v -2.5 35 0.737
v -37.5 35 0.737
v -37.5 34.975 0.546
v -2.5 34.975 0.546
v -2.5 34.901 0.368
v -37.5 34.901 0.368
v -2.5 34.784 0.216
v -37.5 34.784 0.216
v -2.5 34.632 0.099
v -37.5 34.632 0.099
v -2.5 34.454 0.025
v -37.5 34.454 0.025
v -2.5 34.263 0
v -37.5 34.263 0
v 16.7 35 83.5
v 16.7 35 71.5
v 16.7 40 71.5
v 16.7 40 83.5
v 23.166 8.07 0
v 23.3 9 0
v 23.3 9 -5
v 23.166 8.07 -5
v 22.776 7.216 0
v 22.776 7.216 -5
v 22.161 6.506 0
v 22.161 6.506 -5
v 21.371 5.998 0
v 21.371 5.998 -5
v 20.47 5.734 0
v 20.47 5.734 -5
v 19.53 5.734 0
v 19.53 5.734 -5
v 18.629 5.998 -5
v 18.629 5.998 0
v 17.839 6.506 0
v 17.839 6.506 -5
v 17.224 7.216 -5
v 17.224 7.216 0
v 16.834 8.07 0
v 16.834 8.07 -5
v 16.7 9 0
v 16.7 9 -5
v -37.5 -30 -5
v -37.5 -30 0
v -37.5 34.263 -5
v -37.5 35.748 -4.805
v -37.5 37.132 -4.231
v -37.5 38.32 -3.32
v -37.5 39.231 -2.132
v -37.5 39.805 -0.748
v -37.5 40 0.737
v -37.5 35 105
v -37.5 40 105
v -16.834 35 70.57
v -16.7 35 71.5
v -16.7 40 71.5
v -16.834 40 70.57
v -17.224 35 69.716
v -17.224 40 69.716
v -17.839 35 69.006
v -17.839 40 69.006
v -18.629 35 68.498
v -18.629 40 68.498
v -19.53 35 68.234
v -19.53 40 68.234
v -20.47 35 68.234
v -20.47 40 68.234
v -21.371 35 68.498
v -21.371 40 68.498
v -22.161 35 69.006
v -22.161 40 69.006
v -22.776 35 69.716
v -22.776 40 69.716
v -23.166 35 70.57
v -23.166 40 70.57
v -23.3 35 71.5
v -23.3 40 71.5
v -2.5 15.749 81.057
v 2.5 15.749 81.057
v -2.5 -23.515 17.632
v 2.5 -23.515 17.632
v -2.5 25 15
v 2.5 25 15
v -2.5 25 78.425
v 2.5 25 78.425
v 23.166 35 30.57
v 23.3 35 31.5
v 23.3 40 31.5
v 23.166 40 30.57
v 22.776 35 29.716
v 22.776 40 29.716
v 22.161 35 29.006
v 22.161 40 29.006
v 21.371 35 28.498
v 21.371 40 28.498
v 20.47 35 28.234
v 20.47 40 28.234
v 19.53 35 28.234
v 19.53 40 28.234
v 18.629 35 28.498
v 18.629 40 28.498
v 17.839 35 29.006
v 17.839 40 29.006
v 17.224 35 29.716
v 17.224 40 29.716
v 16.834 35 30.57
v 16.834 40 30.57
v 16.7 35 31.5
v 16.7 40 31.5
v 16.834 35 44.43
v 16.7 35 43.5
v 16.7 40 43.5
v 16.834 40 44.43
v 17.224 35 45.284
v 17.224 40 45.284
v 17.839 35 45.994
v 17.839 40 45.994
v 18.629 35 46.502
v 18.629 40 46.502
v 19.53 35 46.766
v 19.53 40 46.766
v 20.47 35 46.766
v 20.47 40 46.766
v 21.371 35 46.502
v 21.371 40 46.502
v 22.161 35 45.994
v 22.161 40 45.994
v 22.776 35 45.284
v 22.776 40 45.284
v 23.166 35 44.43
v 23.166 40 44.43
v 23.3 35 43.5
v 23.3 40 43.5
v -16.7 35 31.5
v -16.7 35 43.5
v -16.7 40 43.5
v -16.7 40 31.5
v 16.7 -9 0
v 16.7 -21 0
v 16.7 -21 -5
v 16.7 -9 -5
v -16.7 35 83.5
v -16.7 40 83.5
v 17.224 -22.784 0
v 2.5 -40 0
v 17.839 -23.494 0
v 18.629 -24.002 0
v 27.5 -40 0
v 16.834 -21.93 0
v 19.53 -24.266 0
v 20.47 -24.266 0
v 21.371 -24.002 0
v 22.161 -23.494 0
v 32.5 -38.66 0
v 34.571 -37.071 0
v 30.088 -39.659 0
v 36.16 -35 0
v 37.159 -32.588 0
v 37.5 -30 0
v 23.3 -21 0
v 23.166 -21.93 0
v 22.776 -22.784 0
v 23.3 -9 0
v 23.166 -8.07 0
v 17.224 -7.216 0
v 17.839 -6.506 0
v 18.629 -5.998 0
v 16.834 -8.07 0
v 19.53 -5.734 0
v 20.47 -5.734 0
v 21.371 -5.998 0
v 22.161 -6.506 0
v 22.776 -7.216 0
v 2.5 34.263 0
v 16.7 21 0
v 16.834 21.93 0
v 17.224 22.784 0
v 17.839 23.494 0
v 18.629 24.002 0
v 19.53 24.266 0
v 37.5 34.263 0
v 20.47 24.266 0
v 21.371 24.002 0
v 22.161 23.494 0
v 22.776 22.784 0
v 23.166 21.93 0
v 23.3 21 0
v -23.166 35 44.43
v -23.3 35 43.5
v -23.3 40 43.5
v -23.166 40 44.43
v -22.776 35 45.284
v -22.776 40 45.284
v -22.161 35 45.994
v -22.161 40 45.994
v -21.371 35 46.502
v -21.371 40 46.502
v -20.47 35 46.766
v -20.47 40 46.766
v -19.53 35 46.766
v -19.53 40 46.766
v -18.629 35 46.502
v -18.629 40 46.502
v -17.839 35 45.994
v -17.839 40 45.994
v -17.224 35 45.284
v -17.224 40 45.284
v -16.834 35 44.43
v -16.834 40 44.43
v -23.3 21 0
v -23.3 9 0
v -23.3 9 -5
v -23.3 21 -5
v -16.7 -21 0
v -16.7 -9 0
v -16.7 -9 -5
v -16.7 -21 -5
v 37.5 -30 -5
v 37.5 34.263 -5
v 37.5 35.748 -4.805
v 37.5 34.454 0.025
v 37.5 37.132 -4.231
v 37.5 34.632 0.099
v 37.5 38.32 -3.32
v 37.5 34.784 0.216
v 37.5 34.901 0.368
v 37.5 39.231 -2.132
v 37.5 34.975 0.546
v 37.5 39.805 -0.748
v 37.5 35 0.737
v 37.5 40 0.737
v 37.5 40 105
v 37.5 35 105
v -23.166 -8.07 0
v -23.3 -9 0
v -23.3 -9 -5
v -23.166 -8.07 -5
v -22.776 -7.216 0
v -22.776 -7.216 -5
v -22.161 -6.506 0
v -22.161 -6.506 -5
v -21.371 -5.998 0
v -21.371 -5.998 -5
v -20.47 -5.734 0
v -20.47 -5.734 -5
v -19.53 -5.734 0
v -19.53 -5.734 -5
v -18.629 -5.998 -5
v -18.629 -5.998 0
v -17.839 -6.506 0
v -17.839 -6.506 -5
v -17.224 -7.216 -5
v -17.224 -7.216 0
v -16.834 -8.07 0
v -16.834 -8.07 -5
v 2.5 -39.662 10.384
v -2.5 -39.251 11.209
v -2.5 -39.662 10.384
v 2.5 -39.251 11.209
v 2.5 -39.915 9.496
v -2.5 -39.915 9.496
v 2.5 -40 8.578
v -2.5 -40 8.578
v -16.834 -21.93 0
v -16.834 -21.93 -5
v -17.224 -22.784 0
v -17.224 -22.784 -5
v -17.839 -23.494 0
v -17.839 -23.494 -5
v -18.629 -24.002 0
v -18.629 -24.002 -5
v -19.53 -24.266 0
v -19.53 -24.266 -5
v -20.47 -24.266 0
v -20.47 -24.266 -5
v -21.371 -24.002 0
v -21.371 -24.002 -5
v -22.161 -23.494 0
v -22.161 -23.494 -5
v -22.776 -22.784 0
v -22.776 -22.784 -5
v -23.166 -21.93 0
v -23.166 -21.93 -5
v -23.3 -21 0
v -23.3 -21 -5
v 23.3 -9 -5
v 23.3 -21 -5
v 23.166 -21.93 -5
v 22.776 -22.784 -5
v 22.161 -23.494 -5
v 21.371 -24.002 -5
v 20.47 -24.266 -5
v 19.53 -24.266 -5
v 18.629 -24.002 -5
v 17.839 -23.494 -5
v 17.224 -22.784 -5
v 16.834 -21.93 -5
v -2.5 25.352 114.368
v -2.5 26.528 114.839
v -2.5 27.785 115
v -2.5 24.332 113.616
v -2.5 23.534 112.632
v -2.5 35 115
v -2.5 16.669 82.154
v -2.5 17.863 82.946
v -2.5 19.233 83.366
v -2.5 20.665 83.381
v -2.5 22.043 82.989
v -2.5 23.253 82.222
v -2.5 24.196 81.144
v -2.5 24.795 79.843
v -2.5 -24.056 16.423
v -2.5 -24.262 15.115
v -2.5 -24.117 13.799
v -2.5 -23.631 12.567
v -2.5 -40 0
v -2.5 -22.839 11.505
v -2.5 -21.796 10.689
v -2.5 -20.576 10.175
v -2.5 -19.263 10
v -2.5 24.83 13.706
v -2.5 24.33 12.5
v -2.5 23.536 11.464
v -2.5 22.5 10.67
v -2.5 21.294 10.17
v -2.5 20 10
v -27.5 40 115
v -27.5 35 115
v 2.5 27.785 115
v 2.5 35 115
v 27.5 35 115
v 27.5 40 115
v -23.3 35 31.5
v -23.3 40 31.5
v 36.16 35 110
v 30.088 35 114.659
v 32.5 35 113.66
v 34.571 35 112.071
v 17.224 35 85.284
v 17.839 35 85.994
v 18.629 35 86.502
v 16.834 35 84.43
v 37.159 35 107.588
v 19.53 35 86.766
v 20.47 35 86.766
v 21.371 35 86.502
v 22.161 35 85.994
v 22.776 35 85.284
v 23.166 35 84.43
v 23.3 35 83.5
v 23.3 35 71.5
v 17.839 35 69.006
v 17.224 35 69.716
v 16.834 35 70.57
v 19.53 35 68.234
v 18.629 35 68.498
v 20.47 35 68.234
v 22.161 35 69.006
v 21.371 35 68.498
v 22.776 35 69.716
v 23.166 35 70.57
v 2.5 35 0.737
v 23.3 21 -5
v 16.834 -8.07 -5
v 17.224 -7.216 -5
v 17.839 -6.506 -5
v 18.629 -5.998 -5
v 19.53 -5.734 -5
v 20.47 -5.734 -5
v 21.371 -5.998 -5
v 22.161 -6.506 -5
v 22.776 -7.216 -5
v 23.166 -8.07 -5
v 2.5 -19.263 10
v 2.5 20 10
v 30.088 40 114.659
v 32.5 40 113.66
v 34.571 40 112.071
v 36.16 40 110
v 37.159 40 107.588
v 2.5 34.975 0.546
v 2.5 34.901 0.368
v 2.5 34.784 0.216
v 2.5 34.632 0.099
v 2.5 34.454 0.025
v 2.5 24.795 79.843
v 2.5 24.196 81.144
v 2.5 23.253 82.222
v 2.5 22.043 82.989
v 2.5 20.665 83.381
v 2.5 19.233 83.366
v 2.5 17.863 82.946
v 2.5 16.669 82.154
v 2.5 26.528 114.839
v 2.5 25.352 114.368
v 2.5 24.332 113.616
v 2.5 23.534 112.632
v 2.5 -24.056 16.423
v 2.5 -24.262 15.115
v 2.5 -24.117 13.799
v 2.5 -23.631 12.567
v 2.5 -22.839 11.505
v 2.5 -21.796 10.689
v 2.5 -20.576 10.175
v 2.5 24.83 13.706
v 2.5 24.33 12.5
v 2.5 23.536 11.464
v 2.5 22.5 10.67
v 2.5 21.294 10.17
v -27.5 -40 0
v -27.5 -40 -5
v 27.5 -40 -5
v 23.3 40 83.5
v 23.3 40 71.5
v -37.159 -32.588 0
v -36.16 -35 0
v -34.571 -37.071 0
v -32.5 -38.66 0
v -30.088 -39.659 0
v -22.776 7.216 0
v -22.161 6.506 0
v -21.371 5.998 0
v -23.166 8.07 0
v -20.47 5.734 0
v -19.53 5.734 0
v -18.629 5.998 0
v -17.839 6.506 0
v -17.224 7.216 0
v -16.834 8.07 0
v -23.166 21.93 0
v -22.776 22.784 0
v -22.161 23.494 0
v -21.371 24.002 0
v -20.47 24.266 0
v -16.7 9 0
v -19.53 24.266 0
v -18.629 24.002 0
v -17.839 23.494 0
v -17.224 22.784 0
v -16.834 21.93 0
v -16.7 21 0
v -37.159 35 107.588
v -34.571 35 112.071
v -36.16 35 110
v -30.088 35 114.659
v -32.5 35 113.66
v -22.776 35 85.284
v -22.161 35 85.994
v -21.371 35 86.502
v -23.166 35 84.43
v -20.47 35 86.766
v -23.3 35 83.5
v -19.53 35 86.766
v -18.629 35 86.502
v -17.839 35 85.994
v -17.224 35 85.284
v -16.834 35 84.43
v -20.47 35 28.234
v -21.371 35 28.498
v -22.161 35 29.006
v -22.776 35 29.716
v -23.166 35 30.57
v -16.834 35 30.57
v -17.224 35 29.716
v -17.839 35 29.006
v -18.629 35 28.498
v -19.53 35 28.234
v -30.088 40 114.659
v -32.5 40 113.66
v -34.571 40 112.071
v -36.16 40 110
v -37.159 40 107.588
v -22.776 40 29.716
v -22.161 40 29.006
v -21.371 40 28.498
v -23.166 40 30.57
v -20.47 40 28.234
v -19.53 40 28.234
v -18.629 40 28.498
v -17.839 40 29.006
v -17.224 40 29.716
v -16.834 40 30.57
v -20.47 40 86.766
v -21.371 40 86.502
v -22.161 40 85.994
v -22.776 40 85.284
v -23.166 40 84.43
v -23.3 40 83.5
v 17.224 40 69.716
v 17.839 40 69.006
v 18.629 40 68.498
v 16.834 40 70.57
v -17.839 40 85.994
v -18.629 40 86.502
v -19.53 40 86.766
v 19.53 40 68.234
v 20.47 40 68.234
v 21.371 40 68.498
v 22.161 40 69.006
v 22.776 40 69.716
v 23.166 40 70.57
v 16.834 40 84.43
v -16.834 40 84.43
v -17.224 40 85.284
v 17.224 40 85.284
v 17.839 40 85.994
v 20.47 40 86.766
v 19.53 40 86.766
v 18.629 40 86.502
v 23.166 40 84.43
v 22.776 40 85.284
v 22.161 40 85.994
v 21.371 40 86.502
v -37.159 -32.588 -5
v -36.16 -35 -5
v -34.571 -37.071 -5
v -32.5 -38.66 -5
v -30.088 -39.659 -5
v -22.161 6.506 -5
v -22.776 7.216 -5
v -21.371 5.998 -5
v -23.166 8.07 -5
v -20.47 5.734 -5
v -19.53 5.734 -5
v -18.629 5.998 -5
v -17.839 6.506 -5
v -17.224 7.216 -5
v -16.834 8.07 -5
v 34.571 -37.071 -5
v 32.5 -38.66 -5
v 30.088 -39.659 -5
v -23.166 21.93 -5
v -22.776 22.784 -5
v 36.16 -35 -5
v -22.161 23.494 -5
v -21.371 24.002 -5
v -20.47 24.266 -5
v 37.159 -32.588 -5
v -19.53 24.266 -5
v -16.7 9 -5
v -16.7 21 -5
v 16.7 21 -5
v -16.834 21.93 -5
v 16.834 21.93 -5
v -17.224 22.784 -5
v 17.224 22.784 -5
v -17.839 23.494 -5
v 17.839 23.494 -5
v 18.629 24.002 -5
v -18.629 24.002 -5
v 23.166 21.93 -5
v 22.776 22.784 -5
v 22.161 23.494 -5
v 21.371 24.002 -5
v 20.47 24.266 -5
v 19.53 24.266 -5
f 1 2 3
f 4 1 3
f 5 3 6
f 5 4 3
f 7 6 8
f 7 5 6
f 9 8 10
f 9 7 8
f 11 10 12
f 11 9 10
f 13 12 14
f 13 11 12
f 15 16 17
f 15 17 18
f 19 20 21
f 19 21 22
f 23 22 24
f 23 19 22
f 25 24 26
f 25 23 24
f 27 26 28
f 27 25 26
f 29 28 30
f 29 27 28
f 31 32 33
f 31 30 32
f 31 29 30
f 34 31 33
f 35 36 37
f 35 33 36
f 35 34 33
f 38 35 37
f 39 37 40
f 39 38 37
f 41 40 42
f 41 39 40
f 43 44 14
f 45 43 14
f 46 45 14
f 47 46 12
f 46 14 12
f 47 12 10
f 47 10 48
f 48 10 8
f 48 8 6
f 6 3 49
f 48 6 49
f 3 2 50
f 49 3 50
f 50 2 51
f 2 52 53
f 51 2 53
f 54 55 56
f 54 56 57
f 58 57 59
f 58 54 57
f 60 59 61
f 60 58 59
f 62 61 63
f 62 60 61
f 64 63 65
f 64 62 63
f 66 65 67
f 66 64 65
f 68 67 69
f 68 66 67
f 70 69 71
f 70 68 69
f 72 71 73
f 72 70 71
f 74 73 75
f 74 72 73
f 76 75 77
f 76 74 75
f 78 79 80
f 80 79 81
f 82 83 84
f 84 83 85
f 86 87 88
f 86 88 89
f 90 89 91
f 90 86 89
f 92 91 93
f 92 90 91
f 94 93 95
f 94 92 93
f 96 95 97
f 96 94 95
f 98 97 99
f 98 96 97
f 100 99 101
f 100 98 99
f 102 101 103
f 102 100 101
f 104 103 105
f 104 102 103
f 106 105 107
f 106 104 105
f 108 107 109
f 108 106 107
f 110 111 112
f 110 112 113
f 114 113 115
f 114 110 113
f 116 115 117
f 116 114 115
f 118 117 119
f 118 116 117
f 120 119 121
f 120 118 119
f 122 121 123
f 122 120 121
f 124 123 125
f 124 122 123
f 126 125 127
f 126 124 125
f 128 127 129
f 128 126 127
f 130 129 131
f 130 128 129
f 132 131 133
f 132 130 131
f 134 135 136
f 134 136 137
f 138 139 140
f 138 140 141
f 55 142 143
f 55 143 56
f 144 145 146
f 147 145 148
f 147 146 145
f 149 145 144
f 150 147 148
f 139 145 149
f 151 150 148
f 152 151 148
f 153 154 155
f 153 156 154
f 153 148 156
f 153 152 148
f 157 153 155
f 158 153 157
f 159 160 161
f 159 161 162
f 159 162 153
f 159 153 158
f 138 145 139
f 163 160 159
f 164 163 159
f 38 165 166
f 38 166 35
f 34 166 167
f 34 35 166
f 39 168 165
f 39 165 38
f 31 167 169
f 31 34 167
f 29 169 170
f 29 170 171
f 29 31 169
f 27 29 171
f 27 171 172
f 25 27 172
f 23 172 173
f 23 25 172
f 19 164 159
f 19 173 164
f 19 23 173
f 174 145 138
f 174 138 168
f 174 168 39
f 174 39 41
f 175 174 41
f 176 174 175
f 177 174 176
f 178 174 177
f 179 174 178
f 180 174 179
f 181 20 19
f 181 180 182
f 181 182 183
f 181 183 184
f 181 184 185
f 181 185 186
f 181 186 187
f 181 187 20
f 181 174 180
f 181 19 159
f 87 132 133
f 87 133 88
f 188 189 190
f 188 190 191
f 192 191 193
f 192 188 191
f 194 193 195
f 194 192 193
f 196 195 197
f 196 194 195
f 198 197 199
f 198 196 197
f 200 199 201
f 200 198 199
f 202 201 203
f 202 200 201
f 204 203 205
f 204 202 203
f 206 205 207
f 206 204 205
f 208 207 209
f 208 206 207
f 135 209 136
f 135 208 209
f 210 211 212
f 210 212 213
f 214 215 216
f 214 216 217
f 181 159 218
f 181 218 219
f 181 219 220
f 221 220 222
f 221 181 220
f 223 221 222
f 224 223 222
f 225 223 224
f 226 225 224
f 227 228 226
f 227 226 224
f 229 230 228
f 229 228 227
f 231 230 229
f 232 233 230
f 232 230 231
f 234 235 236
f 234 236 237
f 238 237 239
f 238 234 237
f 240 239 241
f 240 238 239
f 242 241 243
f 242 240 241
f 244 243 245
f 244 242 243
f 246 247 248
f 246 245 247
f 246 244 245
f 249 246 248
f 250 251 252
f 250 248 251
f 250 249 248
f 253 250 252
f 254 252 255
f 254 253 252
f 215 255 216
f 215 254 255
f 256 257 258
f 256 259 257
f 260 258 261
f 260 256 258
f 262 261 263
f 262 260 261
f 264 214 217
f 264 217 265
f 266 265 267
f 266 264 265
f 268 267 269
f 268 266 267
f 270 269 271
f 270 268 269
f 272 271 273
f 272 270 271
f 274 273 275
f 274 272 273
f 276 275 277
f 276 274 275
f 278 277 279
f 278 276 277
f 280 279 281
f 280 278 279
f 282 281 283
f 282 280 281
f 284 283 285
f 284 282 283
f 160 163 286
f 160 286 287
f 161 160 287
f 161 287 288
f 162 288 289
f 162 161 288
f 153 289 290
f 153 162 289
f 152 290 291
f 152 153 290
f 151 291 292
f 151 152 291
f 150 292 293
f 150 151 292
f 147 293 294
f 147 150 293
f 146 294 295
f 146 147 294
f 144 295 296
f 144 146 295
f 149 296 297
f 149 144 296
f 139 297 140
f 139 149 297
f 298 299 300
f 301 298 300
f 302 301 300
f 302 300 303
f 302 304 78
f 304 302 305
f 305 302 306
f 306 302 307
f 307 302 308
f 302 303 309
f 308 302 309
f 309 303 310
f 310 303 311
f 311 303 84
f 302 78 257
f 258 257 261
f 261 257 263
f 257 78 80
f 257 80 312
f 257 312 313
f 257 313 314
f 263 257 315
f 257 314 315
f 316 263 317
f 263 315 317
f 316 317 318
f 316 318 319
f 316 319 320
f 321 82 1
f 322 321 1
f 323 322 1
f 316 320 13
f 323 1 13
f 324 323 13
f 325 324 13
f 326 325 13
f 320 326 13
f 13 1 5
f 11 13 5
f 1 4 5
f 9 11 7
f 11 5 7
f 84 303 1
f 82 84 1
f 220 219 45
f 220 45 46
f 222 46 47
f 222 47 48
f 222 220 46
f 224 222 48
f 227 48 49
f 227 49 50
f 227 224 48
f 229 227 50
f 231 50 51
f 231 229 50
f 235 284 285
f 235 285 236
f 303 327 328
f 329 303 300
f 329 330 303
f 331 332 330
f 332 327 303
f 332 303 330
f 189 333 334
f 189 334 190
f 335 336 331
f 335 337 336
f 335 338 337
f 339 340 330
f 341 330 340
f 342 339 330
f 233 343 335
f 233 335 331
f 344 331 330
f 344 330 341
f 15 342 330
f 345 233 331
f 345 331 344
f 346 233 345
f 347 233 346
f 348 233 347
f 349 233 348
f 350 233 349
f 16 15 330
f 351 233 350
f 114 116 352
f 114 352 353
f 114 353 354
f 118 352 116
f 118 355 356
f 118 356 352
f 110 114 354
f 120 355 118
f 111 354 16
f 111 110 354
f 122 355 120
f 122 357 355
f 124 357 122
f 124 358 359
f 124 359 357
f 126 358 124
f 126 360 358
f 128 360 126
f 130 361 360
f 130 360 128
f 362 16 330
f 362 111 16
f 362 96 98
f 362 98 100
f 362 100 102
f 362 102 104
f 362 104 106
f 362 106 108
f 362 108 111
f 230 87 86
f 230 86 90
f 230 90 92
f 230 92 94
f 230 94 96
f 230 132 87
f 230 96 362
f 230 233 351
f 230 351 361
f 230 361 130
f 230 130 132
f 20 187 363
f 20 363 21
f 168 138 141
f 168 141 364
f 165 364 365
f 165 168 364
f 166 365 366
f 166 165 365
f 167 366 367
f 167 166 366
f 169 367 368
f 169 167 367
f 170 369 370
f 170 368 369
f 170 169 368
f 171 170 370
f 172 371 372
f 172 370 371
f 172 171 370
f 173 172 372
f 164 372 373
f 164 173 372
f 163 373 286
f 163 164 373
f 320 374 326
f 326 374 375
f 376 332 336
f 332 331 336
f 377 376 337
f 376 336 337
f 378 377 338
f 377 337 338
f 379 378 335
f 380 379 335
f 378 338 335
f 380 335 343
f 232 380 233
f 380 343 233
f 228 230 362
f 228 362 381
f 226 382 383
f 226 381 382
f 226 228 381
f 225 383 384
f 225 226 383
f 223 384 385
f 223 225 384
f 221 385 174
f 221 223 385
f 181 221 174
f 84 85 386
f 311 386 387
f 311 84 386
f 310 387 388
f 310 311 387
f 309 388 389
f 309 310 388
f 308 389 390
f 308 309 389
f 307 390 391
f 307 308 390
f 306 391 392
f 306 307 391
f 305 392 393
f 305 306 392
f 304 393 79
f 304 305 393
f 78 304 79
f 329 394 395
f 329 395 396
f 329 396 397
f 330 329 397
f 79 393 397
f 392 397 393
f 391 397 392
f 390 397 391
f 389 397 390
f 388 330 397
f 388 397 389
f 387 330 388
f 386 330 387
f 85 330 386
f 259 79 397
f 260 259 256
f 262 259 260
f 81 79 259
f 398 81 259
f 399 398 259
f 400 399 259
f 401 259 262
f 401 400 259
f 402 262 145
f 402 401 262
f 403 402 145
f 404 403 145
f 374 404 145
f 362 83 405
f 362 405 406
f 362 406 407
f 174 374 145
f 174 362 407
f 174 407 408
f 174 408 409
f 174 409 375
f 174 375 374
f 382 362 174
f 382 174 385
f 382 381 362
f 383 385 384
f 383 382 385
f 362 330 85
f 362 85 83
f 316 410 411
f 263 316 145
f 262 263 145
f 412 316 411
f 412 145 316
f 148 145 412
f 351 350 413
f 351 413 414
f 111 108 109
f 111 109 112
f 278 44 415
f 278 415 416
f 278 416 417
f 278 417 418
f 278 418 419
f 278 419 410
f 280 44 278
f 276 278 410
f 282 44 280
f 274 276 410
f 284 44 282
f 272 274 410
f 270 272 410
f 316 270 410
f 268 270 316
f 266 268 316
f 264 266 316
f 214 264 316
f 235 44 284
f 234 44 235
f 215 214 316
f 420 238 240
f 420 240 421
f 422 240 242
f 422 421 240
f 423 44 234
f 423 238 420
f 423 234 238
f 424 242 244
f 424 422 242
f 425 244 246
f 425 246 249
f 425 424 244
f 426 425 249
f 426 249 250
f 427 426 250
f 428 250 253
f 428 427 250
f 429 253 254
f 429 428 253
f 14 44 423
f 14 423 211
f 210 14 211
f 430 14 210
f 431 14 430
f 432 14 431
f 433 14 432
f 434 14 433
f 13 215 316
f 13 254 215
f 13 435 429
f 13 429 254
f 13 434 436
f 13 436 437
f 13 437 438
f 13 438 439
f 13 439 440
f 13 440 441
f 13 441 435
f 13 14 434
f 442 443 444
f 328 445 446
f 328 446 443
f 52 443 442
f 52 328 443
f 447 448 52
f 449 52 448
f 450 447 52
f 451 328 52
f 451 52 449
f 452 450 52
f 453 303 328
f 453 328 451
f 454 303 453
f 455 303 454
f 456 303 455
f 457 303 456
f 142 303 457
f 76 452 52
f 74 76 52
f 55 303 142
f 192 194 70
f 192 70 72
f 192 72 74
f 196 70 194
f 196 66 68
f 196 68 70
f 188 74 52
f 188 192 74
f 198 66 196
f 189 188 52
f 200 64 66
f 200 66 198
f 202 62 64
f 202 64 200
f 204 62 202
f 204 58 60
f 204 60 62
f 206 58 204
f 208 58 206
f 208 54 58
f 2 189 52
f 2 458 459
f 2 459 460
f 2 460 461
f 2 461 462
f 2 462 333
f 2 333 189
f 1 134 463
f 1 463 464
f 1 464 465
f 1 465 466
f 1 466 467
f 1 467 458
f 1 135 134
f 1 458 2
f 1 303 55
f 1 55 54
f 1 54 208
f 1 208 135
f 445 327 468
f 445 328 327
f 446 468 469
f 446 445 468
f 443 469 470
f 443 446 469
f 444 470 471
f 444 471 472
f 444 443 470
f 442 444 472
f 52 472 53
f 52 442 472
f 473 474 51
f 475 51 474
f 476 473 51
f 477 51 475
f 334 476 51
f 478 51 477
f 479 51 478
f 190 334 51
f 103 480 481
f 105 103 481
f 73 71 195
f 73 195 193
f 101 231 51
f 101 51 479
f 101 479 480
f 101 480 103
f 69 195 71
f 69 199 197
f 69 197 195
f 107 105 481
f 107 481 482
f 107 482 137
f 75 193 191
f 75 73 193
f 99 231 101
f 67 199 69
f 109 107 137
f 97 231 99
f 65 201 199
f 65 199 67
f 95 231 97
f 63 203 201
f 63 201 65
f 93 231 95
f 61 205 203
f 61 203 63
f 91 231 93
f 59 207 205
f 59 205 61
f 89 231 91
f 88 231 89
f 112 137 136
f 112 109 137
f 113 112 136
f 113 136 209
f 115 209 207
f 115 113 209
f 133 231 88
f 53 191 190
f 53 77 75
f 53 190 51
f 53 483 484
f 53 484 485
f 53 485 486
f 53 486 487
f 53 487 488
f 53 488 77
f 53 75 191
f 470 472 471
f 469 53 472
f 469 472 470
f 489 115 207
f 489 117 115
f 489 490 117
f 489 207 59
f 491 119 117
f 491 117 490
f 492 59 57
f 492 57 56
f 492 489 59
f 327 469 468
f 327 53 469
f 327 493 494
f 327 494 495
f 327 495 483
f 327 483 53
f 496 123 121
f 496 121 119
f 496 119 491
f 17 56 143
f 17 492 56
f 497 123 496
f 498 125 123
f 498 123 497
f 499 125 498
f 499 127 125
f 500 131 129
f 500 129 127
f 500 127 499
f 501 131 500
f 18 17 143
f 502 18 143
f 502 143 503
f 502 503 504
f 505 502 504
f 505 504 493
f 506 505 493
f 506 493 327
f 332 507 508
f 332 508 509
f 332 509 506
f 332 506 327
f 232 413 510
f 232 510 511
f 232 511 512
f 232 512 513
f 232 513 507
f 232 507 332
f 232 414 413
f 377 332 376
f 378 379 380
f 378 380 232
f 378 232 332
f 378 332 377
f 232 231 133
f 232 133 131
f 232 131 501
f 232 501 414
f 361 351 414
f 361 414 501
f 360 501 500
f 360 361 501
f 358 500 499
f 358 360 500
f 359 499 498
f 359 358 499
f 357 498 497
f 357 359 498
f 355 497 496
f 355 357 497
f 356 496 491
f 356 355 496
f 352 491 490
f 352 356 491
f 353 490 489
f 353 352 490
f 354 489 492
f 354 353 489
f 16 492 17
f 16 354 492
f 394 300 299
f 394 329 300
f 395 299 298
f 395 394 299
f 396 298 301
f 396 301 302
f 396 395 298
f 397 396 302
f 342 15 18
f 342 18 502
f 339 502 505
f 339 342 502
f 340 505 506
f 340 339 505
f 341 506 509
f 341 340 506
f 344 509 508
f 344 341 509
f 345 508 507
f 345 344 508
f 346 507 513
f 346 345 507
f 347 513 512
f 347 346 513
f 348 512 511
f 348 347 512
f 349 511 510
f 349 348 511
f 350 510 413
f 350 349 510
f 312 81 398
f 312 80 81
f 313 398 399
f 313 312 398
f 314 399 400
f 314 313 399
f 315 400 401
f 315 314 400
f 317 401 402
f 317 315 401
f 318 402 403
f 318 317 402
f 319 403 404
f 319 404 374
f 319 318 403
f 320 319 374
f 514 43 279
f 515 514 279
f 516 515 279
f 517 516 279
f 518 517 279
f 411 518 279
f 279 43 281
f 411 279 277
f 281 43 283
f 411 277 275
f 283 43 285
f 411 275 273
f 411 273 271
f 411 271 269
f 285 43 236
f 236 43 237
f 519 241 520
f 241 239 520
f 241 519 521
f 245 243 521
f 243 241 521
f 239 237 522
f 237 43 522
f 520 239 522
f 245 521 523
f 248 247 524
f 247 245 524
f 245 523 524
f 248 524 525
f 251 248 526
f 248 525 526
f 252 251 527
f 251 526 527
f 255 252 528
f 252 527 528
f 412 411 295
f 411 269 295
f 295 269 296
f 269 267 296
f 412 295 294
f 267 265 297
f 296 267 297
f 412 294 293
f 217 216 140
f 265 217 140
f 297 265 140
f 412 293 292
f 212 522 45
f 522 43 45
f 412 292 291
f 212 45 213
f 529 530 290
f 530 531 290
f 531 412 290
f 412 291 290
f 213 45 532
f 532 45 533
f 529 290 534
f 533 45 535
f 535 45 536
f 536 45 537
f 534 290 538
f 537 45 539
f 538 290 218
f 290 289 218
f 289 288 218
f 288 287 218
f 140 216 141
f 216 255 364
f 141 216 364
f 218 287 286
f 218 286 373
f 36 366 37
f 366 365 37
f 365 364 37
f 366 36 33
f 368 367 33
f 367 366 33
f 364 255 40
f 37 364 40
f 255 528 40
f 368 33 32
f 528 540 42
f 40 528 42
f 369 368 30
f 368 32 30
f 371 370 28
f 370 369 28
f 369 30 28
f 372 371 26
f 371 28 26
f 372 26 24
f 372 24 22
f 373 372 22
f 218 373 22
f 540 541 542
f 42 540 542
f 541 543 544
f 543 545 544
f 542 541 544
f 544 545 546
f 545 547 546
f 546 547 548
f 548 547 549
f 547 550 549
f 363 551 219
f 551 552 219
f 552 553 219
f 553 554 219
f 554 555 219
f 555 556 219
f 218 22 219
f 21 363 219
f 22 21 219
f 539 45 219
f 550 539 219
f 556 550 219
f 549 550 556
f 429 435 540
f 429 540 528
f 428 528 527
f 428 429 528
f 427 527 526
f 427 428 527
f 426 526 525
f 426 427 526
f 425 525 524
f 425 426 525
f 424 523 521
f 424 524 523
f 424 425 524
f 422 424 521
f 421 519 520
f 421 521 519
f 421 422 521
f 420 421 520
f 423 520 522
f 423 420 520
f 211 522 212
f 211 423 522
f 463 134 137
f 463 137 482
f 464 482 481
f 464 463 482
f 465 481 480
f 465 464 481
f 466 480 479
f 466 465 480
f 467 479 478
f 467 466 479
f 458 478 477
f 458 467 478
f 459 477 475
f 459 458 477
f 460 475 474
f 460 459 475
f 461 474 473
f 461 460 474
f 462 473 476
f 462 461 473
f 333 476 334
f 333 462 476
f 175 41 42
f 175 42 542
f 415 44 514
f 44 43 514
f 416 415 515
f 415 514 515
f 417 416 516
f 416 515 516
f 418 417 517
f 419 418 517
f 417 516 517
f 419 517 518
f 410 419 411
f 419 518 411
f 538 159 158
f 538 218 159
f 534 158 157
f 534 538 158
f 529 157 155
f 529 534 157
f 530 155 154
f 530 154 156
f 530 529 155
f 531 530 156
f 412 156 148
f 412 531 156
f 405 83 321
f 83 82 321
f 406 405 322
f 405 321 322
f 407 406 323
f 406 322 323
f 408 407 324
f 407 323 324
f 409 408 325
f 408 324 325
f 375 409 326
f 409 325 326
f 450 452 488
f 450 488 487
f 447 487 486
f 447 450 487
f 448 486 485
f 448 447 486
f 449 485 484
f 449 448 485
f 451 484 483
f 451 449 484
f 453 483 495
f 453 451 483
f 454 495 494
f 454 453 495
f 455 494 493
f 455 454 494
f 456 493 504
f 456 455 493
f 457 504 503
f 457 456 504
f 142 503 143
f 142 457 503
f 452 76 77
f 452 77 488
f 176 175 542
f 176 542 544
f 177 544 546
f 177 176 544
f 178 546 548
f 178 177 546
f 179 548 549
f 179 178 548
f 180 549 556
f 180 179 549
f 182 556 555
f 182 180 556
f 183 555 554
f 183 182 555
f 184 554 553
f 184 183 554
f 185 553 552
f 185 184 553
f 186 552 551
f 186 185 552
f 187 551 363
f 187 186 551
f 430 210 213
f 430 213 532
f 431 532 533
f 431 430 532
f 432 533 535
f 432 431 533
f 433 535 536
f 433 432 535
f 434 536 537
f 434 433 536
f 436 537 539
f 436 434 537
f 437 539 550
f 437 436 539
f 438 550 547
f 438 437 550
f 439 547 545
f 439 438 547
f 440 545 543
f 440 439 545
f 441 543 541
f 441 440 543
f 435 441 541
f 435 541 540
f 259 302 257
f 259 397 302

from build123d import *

# Parameters (mm, degrees)
SKETCH_1_W                       = 75
SKETCH_1_H                       = 80
SM_BASE_FLANGE_1_DEPTH           = 5
SM_EDGE_FLANGE_1_STRIP_W         = 21.4732
SM_EDGE_FLANGE_1_STRIP_H         = 5
SM_EDGE_FLANGE_1_STRIP_CUT_DEPTH = 75
SM_EDGE_FLANGE_1_DEPTH           = 75
EXTRUDE_1_DEPTH                  = 2.5
CUT_EXTRUDE_1_DEPTH              = 129.16005618
FILLET_1_R                       = 5
FILLET_2_R                       = 10
CUT_EXTRUDE_2_DEPTH              = 128.401923062
CUT_EXTRUDE_3_DEPTH              = 143.324453275


# Sheet-metal steps are written as plain solids
with BuildPart() as part:
    # Sketch 1 → 基体-法兰1 (new body)
    with BuildSketch(Plane.XY):
        Rectangle(SKETCH_1_W, SKETCH_1_H)
    extrude(amount=-SM_BASE_FLANGE_1_DEPTH)

    # 边线-法兰1 strip (across the edge) → 边线-法兰1 strip cut (cut)
    with BuildSketch(Plane(origin=(37.5, 40, 0), x_dir=(0, -1, 0), z_dir=(-1, 0, 0))):
        with Locations((-5, -2.5)):
            Rectangle(SM_EDGE_FLANGE_1_STRIP_W, SM_EDGE_FLANGE_1_STRIP_H)
    extrude(amount=SM_EDGE_FLANGE_1_STRIP_CUT_DEPTH, mode=Mode.SUBTRACT)

    # 边线-法兰1 section (across the edge) → 边线-法兰1 (add)
    with BuildSketch(Plane(origin=(37.5, 40, 0), x_dir=(0, -1, 0), z_dir=(-1, 0, 0))):
        with BuildLine():
            Line((0, 0.7366), (0, 115))
            Line((0, 115), (5, 115))
            Line((5, 115), (5, 0.7366))
            ThreePointArc((5, 0.7366), (5.215745145, 0.215745145), (5.7366, 0))
            Line((5.7366, 0), (5.7366, -5))
            ThreePointArc((5.7366, -5), (1.680211239, -3.319788761), (0, 0.7366))
        make_face()
    extrude(amount=SM_EDGE_FLANGE_1_DEPTH)

    # 草图9 → 凸台-拉伸1 (add, symmetric)
    with BuildSketch(Plane(origin=(0, 0, 0), x_dir=(0, 0, -1), z_dir=(1, 0, 0))):
        with BuildLine():
            Line((-115, 35), (-115, 25))
            Line((-115, 25), (-10, -40))
            Line((-10, -40), (0, -40))
            Line((0, -40), (0, 34.2634))
            ThreePointArc((0, 34.2634), (-0.215745145, 34.784254855), (-0.7366, 35))
            Line((-0.7366, 35), (-115, 35))
        make_face()
    extrude(amount=EXTRUDE_1_DEPTH, both=True)

    # 草图10 → 切除-拉伸1 (cut, through all)
    with BuildSketch(Plane(origin=(2.5, 0, 0), x_dir=(0, 0, -1), z_dir=(1, 0, 0))):
        Polygon((-10, 25), (-96.001401484, 25), (-10, -28.238962824), align=None)
    extrude(amount=-CUT_EXTRUDE_1_DEPTH, mode=Mode.SUBTRACT)

    # 圆角1
    fillet_1_edges = [part.edges().sort_by_distance(p)[0] for p in [
        (0, 25, 115),
        (0, -40, 10),
        (0, 25, 10),
        (0, -28.238962824, 10),
        (0, 25, 96.001401484),
    ]]
    fillet(fillet_1_edges, radius=FILLET_1_R)

    # 圆角2
    fillet_2_edges = [part.edges().sort_by_distance(p)[0] for p in [
        (37.5, 37.5, 115),
        (-37.5, 37.5, 115),
        (37.5, -40, -2.5),
        (-37.5, -40, -2.5),
    ]]
    fillet(fillet_2_edges, radius=FILLET_2_R)

    # 草图11 → 切除-拉伸2 (cut, through all)
    with BuildSketch(Plane.XY):
        with BuildLine():
            Line((-16.7, -9), (-16.7, -21))
            ThreePointArc((-16.7, -21), (-20, -24.3), (-23.3, -21))
            Line((-23.3, -21), (-23.3, -9))
            ThreePointArc((-23.3, -9), (-20, -5.7), (-16.7, -9))
        make_face()
        with BuildLine():
            Line((-23.3, 9), (-23.3, 21))
            ThreePointArc((-23.3, 21), (-20, 24.3), (-16.7, 21))
            Line((-16.7, 21), (-16.7, 9))
            ThreePointArc((-16.7, 9), (-20, 5.7), (-23.3, 9))
        make_face()
        with BuildLine():
            Line((16.7, 9), (16.7, 21))
            ThreePointArc((16.7, 21), (20, 24.3), (23.3, 21))
            Line((23.3, 21), (23.3, 9))
            ThreePointArc((23.3, 9), (20, 5.7), (16.7, 9))
        make_face()
        with BuildLine():
            Line((23.3, -9), (23.3, -21))
            ThreePointArc((23.3, -21), (20, -24.3), (16.7, -21))
            Line((16.7, -21), (16.7, -9))
            ThreePointArc((16.7, -9), (20, -5.7), (23.3, -9))
        make_face()
    extrude(amount=-CUT_EXTRUDE_2_DEPTH, mode=Mode.SUBTRACT)

    # 草图12 → 切除-拉伸3 (cut, through all)
    with BuildSketch(Plane.XZ.offset(-35)):
        with BuildLine():
            Line((-16.7, 83.5), (-16.7, 71.5))
            ThreePointArc((-16.7, 71.5), (-20, 68.2), (-23.3, 71.5))
            Line((-23.3, 71.5), (-23.3, 83.5))
            ThreePointArc((-23.3, 83.5), (-20, 86.8), (-16.7, 83.5))
        make_face()
        with BuildLine():
            Line((23.3, 83.5), (23.3, 71.5))
            ThreePointArc((23.3, 71.5), (20, 68.2), (16.7, 71.5))
            Line((16.7, 71.5), (16.7, 83.5))
            ThreePointArc((16.7, 83.5), (20, 86.8), (23.3, 83.5))
        make_face()
        with BuildLine():
            Line((16.7, 31.5), (16.7, 43.5))
            ThreePointArc((16.7, 43.5), (20, 46.8), (23.3, 43.5))
            Line((23.3, 43.5), (23.3, 31.5))
            ThreePointArc((23.3, 31.5), (20, 28.2), (16.7, 31.5))
        make_face()
        with BuildLine():
            Line((-23.3, 31.5), (-23.3, 43.5))
            ThreePointArc((-23.3, 43.5), (-20, 46.8), (-16.7, 43.5))
            Line((-16.7, 43.5), (-16.7, 31.5))
            ThreePointArc((-16.7, 31.5), (-20, 28.2), (-23.3, 31.5))
        make_face()
    extrude(amount=-CUT_EXTRUDE_3_DEPTH, mode=Mode.SUBTRACT)


solid = part.part
